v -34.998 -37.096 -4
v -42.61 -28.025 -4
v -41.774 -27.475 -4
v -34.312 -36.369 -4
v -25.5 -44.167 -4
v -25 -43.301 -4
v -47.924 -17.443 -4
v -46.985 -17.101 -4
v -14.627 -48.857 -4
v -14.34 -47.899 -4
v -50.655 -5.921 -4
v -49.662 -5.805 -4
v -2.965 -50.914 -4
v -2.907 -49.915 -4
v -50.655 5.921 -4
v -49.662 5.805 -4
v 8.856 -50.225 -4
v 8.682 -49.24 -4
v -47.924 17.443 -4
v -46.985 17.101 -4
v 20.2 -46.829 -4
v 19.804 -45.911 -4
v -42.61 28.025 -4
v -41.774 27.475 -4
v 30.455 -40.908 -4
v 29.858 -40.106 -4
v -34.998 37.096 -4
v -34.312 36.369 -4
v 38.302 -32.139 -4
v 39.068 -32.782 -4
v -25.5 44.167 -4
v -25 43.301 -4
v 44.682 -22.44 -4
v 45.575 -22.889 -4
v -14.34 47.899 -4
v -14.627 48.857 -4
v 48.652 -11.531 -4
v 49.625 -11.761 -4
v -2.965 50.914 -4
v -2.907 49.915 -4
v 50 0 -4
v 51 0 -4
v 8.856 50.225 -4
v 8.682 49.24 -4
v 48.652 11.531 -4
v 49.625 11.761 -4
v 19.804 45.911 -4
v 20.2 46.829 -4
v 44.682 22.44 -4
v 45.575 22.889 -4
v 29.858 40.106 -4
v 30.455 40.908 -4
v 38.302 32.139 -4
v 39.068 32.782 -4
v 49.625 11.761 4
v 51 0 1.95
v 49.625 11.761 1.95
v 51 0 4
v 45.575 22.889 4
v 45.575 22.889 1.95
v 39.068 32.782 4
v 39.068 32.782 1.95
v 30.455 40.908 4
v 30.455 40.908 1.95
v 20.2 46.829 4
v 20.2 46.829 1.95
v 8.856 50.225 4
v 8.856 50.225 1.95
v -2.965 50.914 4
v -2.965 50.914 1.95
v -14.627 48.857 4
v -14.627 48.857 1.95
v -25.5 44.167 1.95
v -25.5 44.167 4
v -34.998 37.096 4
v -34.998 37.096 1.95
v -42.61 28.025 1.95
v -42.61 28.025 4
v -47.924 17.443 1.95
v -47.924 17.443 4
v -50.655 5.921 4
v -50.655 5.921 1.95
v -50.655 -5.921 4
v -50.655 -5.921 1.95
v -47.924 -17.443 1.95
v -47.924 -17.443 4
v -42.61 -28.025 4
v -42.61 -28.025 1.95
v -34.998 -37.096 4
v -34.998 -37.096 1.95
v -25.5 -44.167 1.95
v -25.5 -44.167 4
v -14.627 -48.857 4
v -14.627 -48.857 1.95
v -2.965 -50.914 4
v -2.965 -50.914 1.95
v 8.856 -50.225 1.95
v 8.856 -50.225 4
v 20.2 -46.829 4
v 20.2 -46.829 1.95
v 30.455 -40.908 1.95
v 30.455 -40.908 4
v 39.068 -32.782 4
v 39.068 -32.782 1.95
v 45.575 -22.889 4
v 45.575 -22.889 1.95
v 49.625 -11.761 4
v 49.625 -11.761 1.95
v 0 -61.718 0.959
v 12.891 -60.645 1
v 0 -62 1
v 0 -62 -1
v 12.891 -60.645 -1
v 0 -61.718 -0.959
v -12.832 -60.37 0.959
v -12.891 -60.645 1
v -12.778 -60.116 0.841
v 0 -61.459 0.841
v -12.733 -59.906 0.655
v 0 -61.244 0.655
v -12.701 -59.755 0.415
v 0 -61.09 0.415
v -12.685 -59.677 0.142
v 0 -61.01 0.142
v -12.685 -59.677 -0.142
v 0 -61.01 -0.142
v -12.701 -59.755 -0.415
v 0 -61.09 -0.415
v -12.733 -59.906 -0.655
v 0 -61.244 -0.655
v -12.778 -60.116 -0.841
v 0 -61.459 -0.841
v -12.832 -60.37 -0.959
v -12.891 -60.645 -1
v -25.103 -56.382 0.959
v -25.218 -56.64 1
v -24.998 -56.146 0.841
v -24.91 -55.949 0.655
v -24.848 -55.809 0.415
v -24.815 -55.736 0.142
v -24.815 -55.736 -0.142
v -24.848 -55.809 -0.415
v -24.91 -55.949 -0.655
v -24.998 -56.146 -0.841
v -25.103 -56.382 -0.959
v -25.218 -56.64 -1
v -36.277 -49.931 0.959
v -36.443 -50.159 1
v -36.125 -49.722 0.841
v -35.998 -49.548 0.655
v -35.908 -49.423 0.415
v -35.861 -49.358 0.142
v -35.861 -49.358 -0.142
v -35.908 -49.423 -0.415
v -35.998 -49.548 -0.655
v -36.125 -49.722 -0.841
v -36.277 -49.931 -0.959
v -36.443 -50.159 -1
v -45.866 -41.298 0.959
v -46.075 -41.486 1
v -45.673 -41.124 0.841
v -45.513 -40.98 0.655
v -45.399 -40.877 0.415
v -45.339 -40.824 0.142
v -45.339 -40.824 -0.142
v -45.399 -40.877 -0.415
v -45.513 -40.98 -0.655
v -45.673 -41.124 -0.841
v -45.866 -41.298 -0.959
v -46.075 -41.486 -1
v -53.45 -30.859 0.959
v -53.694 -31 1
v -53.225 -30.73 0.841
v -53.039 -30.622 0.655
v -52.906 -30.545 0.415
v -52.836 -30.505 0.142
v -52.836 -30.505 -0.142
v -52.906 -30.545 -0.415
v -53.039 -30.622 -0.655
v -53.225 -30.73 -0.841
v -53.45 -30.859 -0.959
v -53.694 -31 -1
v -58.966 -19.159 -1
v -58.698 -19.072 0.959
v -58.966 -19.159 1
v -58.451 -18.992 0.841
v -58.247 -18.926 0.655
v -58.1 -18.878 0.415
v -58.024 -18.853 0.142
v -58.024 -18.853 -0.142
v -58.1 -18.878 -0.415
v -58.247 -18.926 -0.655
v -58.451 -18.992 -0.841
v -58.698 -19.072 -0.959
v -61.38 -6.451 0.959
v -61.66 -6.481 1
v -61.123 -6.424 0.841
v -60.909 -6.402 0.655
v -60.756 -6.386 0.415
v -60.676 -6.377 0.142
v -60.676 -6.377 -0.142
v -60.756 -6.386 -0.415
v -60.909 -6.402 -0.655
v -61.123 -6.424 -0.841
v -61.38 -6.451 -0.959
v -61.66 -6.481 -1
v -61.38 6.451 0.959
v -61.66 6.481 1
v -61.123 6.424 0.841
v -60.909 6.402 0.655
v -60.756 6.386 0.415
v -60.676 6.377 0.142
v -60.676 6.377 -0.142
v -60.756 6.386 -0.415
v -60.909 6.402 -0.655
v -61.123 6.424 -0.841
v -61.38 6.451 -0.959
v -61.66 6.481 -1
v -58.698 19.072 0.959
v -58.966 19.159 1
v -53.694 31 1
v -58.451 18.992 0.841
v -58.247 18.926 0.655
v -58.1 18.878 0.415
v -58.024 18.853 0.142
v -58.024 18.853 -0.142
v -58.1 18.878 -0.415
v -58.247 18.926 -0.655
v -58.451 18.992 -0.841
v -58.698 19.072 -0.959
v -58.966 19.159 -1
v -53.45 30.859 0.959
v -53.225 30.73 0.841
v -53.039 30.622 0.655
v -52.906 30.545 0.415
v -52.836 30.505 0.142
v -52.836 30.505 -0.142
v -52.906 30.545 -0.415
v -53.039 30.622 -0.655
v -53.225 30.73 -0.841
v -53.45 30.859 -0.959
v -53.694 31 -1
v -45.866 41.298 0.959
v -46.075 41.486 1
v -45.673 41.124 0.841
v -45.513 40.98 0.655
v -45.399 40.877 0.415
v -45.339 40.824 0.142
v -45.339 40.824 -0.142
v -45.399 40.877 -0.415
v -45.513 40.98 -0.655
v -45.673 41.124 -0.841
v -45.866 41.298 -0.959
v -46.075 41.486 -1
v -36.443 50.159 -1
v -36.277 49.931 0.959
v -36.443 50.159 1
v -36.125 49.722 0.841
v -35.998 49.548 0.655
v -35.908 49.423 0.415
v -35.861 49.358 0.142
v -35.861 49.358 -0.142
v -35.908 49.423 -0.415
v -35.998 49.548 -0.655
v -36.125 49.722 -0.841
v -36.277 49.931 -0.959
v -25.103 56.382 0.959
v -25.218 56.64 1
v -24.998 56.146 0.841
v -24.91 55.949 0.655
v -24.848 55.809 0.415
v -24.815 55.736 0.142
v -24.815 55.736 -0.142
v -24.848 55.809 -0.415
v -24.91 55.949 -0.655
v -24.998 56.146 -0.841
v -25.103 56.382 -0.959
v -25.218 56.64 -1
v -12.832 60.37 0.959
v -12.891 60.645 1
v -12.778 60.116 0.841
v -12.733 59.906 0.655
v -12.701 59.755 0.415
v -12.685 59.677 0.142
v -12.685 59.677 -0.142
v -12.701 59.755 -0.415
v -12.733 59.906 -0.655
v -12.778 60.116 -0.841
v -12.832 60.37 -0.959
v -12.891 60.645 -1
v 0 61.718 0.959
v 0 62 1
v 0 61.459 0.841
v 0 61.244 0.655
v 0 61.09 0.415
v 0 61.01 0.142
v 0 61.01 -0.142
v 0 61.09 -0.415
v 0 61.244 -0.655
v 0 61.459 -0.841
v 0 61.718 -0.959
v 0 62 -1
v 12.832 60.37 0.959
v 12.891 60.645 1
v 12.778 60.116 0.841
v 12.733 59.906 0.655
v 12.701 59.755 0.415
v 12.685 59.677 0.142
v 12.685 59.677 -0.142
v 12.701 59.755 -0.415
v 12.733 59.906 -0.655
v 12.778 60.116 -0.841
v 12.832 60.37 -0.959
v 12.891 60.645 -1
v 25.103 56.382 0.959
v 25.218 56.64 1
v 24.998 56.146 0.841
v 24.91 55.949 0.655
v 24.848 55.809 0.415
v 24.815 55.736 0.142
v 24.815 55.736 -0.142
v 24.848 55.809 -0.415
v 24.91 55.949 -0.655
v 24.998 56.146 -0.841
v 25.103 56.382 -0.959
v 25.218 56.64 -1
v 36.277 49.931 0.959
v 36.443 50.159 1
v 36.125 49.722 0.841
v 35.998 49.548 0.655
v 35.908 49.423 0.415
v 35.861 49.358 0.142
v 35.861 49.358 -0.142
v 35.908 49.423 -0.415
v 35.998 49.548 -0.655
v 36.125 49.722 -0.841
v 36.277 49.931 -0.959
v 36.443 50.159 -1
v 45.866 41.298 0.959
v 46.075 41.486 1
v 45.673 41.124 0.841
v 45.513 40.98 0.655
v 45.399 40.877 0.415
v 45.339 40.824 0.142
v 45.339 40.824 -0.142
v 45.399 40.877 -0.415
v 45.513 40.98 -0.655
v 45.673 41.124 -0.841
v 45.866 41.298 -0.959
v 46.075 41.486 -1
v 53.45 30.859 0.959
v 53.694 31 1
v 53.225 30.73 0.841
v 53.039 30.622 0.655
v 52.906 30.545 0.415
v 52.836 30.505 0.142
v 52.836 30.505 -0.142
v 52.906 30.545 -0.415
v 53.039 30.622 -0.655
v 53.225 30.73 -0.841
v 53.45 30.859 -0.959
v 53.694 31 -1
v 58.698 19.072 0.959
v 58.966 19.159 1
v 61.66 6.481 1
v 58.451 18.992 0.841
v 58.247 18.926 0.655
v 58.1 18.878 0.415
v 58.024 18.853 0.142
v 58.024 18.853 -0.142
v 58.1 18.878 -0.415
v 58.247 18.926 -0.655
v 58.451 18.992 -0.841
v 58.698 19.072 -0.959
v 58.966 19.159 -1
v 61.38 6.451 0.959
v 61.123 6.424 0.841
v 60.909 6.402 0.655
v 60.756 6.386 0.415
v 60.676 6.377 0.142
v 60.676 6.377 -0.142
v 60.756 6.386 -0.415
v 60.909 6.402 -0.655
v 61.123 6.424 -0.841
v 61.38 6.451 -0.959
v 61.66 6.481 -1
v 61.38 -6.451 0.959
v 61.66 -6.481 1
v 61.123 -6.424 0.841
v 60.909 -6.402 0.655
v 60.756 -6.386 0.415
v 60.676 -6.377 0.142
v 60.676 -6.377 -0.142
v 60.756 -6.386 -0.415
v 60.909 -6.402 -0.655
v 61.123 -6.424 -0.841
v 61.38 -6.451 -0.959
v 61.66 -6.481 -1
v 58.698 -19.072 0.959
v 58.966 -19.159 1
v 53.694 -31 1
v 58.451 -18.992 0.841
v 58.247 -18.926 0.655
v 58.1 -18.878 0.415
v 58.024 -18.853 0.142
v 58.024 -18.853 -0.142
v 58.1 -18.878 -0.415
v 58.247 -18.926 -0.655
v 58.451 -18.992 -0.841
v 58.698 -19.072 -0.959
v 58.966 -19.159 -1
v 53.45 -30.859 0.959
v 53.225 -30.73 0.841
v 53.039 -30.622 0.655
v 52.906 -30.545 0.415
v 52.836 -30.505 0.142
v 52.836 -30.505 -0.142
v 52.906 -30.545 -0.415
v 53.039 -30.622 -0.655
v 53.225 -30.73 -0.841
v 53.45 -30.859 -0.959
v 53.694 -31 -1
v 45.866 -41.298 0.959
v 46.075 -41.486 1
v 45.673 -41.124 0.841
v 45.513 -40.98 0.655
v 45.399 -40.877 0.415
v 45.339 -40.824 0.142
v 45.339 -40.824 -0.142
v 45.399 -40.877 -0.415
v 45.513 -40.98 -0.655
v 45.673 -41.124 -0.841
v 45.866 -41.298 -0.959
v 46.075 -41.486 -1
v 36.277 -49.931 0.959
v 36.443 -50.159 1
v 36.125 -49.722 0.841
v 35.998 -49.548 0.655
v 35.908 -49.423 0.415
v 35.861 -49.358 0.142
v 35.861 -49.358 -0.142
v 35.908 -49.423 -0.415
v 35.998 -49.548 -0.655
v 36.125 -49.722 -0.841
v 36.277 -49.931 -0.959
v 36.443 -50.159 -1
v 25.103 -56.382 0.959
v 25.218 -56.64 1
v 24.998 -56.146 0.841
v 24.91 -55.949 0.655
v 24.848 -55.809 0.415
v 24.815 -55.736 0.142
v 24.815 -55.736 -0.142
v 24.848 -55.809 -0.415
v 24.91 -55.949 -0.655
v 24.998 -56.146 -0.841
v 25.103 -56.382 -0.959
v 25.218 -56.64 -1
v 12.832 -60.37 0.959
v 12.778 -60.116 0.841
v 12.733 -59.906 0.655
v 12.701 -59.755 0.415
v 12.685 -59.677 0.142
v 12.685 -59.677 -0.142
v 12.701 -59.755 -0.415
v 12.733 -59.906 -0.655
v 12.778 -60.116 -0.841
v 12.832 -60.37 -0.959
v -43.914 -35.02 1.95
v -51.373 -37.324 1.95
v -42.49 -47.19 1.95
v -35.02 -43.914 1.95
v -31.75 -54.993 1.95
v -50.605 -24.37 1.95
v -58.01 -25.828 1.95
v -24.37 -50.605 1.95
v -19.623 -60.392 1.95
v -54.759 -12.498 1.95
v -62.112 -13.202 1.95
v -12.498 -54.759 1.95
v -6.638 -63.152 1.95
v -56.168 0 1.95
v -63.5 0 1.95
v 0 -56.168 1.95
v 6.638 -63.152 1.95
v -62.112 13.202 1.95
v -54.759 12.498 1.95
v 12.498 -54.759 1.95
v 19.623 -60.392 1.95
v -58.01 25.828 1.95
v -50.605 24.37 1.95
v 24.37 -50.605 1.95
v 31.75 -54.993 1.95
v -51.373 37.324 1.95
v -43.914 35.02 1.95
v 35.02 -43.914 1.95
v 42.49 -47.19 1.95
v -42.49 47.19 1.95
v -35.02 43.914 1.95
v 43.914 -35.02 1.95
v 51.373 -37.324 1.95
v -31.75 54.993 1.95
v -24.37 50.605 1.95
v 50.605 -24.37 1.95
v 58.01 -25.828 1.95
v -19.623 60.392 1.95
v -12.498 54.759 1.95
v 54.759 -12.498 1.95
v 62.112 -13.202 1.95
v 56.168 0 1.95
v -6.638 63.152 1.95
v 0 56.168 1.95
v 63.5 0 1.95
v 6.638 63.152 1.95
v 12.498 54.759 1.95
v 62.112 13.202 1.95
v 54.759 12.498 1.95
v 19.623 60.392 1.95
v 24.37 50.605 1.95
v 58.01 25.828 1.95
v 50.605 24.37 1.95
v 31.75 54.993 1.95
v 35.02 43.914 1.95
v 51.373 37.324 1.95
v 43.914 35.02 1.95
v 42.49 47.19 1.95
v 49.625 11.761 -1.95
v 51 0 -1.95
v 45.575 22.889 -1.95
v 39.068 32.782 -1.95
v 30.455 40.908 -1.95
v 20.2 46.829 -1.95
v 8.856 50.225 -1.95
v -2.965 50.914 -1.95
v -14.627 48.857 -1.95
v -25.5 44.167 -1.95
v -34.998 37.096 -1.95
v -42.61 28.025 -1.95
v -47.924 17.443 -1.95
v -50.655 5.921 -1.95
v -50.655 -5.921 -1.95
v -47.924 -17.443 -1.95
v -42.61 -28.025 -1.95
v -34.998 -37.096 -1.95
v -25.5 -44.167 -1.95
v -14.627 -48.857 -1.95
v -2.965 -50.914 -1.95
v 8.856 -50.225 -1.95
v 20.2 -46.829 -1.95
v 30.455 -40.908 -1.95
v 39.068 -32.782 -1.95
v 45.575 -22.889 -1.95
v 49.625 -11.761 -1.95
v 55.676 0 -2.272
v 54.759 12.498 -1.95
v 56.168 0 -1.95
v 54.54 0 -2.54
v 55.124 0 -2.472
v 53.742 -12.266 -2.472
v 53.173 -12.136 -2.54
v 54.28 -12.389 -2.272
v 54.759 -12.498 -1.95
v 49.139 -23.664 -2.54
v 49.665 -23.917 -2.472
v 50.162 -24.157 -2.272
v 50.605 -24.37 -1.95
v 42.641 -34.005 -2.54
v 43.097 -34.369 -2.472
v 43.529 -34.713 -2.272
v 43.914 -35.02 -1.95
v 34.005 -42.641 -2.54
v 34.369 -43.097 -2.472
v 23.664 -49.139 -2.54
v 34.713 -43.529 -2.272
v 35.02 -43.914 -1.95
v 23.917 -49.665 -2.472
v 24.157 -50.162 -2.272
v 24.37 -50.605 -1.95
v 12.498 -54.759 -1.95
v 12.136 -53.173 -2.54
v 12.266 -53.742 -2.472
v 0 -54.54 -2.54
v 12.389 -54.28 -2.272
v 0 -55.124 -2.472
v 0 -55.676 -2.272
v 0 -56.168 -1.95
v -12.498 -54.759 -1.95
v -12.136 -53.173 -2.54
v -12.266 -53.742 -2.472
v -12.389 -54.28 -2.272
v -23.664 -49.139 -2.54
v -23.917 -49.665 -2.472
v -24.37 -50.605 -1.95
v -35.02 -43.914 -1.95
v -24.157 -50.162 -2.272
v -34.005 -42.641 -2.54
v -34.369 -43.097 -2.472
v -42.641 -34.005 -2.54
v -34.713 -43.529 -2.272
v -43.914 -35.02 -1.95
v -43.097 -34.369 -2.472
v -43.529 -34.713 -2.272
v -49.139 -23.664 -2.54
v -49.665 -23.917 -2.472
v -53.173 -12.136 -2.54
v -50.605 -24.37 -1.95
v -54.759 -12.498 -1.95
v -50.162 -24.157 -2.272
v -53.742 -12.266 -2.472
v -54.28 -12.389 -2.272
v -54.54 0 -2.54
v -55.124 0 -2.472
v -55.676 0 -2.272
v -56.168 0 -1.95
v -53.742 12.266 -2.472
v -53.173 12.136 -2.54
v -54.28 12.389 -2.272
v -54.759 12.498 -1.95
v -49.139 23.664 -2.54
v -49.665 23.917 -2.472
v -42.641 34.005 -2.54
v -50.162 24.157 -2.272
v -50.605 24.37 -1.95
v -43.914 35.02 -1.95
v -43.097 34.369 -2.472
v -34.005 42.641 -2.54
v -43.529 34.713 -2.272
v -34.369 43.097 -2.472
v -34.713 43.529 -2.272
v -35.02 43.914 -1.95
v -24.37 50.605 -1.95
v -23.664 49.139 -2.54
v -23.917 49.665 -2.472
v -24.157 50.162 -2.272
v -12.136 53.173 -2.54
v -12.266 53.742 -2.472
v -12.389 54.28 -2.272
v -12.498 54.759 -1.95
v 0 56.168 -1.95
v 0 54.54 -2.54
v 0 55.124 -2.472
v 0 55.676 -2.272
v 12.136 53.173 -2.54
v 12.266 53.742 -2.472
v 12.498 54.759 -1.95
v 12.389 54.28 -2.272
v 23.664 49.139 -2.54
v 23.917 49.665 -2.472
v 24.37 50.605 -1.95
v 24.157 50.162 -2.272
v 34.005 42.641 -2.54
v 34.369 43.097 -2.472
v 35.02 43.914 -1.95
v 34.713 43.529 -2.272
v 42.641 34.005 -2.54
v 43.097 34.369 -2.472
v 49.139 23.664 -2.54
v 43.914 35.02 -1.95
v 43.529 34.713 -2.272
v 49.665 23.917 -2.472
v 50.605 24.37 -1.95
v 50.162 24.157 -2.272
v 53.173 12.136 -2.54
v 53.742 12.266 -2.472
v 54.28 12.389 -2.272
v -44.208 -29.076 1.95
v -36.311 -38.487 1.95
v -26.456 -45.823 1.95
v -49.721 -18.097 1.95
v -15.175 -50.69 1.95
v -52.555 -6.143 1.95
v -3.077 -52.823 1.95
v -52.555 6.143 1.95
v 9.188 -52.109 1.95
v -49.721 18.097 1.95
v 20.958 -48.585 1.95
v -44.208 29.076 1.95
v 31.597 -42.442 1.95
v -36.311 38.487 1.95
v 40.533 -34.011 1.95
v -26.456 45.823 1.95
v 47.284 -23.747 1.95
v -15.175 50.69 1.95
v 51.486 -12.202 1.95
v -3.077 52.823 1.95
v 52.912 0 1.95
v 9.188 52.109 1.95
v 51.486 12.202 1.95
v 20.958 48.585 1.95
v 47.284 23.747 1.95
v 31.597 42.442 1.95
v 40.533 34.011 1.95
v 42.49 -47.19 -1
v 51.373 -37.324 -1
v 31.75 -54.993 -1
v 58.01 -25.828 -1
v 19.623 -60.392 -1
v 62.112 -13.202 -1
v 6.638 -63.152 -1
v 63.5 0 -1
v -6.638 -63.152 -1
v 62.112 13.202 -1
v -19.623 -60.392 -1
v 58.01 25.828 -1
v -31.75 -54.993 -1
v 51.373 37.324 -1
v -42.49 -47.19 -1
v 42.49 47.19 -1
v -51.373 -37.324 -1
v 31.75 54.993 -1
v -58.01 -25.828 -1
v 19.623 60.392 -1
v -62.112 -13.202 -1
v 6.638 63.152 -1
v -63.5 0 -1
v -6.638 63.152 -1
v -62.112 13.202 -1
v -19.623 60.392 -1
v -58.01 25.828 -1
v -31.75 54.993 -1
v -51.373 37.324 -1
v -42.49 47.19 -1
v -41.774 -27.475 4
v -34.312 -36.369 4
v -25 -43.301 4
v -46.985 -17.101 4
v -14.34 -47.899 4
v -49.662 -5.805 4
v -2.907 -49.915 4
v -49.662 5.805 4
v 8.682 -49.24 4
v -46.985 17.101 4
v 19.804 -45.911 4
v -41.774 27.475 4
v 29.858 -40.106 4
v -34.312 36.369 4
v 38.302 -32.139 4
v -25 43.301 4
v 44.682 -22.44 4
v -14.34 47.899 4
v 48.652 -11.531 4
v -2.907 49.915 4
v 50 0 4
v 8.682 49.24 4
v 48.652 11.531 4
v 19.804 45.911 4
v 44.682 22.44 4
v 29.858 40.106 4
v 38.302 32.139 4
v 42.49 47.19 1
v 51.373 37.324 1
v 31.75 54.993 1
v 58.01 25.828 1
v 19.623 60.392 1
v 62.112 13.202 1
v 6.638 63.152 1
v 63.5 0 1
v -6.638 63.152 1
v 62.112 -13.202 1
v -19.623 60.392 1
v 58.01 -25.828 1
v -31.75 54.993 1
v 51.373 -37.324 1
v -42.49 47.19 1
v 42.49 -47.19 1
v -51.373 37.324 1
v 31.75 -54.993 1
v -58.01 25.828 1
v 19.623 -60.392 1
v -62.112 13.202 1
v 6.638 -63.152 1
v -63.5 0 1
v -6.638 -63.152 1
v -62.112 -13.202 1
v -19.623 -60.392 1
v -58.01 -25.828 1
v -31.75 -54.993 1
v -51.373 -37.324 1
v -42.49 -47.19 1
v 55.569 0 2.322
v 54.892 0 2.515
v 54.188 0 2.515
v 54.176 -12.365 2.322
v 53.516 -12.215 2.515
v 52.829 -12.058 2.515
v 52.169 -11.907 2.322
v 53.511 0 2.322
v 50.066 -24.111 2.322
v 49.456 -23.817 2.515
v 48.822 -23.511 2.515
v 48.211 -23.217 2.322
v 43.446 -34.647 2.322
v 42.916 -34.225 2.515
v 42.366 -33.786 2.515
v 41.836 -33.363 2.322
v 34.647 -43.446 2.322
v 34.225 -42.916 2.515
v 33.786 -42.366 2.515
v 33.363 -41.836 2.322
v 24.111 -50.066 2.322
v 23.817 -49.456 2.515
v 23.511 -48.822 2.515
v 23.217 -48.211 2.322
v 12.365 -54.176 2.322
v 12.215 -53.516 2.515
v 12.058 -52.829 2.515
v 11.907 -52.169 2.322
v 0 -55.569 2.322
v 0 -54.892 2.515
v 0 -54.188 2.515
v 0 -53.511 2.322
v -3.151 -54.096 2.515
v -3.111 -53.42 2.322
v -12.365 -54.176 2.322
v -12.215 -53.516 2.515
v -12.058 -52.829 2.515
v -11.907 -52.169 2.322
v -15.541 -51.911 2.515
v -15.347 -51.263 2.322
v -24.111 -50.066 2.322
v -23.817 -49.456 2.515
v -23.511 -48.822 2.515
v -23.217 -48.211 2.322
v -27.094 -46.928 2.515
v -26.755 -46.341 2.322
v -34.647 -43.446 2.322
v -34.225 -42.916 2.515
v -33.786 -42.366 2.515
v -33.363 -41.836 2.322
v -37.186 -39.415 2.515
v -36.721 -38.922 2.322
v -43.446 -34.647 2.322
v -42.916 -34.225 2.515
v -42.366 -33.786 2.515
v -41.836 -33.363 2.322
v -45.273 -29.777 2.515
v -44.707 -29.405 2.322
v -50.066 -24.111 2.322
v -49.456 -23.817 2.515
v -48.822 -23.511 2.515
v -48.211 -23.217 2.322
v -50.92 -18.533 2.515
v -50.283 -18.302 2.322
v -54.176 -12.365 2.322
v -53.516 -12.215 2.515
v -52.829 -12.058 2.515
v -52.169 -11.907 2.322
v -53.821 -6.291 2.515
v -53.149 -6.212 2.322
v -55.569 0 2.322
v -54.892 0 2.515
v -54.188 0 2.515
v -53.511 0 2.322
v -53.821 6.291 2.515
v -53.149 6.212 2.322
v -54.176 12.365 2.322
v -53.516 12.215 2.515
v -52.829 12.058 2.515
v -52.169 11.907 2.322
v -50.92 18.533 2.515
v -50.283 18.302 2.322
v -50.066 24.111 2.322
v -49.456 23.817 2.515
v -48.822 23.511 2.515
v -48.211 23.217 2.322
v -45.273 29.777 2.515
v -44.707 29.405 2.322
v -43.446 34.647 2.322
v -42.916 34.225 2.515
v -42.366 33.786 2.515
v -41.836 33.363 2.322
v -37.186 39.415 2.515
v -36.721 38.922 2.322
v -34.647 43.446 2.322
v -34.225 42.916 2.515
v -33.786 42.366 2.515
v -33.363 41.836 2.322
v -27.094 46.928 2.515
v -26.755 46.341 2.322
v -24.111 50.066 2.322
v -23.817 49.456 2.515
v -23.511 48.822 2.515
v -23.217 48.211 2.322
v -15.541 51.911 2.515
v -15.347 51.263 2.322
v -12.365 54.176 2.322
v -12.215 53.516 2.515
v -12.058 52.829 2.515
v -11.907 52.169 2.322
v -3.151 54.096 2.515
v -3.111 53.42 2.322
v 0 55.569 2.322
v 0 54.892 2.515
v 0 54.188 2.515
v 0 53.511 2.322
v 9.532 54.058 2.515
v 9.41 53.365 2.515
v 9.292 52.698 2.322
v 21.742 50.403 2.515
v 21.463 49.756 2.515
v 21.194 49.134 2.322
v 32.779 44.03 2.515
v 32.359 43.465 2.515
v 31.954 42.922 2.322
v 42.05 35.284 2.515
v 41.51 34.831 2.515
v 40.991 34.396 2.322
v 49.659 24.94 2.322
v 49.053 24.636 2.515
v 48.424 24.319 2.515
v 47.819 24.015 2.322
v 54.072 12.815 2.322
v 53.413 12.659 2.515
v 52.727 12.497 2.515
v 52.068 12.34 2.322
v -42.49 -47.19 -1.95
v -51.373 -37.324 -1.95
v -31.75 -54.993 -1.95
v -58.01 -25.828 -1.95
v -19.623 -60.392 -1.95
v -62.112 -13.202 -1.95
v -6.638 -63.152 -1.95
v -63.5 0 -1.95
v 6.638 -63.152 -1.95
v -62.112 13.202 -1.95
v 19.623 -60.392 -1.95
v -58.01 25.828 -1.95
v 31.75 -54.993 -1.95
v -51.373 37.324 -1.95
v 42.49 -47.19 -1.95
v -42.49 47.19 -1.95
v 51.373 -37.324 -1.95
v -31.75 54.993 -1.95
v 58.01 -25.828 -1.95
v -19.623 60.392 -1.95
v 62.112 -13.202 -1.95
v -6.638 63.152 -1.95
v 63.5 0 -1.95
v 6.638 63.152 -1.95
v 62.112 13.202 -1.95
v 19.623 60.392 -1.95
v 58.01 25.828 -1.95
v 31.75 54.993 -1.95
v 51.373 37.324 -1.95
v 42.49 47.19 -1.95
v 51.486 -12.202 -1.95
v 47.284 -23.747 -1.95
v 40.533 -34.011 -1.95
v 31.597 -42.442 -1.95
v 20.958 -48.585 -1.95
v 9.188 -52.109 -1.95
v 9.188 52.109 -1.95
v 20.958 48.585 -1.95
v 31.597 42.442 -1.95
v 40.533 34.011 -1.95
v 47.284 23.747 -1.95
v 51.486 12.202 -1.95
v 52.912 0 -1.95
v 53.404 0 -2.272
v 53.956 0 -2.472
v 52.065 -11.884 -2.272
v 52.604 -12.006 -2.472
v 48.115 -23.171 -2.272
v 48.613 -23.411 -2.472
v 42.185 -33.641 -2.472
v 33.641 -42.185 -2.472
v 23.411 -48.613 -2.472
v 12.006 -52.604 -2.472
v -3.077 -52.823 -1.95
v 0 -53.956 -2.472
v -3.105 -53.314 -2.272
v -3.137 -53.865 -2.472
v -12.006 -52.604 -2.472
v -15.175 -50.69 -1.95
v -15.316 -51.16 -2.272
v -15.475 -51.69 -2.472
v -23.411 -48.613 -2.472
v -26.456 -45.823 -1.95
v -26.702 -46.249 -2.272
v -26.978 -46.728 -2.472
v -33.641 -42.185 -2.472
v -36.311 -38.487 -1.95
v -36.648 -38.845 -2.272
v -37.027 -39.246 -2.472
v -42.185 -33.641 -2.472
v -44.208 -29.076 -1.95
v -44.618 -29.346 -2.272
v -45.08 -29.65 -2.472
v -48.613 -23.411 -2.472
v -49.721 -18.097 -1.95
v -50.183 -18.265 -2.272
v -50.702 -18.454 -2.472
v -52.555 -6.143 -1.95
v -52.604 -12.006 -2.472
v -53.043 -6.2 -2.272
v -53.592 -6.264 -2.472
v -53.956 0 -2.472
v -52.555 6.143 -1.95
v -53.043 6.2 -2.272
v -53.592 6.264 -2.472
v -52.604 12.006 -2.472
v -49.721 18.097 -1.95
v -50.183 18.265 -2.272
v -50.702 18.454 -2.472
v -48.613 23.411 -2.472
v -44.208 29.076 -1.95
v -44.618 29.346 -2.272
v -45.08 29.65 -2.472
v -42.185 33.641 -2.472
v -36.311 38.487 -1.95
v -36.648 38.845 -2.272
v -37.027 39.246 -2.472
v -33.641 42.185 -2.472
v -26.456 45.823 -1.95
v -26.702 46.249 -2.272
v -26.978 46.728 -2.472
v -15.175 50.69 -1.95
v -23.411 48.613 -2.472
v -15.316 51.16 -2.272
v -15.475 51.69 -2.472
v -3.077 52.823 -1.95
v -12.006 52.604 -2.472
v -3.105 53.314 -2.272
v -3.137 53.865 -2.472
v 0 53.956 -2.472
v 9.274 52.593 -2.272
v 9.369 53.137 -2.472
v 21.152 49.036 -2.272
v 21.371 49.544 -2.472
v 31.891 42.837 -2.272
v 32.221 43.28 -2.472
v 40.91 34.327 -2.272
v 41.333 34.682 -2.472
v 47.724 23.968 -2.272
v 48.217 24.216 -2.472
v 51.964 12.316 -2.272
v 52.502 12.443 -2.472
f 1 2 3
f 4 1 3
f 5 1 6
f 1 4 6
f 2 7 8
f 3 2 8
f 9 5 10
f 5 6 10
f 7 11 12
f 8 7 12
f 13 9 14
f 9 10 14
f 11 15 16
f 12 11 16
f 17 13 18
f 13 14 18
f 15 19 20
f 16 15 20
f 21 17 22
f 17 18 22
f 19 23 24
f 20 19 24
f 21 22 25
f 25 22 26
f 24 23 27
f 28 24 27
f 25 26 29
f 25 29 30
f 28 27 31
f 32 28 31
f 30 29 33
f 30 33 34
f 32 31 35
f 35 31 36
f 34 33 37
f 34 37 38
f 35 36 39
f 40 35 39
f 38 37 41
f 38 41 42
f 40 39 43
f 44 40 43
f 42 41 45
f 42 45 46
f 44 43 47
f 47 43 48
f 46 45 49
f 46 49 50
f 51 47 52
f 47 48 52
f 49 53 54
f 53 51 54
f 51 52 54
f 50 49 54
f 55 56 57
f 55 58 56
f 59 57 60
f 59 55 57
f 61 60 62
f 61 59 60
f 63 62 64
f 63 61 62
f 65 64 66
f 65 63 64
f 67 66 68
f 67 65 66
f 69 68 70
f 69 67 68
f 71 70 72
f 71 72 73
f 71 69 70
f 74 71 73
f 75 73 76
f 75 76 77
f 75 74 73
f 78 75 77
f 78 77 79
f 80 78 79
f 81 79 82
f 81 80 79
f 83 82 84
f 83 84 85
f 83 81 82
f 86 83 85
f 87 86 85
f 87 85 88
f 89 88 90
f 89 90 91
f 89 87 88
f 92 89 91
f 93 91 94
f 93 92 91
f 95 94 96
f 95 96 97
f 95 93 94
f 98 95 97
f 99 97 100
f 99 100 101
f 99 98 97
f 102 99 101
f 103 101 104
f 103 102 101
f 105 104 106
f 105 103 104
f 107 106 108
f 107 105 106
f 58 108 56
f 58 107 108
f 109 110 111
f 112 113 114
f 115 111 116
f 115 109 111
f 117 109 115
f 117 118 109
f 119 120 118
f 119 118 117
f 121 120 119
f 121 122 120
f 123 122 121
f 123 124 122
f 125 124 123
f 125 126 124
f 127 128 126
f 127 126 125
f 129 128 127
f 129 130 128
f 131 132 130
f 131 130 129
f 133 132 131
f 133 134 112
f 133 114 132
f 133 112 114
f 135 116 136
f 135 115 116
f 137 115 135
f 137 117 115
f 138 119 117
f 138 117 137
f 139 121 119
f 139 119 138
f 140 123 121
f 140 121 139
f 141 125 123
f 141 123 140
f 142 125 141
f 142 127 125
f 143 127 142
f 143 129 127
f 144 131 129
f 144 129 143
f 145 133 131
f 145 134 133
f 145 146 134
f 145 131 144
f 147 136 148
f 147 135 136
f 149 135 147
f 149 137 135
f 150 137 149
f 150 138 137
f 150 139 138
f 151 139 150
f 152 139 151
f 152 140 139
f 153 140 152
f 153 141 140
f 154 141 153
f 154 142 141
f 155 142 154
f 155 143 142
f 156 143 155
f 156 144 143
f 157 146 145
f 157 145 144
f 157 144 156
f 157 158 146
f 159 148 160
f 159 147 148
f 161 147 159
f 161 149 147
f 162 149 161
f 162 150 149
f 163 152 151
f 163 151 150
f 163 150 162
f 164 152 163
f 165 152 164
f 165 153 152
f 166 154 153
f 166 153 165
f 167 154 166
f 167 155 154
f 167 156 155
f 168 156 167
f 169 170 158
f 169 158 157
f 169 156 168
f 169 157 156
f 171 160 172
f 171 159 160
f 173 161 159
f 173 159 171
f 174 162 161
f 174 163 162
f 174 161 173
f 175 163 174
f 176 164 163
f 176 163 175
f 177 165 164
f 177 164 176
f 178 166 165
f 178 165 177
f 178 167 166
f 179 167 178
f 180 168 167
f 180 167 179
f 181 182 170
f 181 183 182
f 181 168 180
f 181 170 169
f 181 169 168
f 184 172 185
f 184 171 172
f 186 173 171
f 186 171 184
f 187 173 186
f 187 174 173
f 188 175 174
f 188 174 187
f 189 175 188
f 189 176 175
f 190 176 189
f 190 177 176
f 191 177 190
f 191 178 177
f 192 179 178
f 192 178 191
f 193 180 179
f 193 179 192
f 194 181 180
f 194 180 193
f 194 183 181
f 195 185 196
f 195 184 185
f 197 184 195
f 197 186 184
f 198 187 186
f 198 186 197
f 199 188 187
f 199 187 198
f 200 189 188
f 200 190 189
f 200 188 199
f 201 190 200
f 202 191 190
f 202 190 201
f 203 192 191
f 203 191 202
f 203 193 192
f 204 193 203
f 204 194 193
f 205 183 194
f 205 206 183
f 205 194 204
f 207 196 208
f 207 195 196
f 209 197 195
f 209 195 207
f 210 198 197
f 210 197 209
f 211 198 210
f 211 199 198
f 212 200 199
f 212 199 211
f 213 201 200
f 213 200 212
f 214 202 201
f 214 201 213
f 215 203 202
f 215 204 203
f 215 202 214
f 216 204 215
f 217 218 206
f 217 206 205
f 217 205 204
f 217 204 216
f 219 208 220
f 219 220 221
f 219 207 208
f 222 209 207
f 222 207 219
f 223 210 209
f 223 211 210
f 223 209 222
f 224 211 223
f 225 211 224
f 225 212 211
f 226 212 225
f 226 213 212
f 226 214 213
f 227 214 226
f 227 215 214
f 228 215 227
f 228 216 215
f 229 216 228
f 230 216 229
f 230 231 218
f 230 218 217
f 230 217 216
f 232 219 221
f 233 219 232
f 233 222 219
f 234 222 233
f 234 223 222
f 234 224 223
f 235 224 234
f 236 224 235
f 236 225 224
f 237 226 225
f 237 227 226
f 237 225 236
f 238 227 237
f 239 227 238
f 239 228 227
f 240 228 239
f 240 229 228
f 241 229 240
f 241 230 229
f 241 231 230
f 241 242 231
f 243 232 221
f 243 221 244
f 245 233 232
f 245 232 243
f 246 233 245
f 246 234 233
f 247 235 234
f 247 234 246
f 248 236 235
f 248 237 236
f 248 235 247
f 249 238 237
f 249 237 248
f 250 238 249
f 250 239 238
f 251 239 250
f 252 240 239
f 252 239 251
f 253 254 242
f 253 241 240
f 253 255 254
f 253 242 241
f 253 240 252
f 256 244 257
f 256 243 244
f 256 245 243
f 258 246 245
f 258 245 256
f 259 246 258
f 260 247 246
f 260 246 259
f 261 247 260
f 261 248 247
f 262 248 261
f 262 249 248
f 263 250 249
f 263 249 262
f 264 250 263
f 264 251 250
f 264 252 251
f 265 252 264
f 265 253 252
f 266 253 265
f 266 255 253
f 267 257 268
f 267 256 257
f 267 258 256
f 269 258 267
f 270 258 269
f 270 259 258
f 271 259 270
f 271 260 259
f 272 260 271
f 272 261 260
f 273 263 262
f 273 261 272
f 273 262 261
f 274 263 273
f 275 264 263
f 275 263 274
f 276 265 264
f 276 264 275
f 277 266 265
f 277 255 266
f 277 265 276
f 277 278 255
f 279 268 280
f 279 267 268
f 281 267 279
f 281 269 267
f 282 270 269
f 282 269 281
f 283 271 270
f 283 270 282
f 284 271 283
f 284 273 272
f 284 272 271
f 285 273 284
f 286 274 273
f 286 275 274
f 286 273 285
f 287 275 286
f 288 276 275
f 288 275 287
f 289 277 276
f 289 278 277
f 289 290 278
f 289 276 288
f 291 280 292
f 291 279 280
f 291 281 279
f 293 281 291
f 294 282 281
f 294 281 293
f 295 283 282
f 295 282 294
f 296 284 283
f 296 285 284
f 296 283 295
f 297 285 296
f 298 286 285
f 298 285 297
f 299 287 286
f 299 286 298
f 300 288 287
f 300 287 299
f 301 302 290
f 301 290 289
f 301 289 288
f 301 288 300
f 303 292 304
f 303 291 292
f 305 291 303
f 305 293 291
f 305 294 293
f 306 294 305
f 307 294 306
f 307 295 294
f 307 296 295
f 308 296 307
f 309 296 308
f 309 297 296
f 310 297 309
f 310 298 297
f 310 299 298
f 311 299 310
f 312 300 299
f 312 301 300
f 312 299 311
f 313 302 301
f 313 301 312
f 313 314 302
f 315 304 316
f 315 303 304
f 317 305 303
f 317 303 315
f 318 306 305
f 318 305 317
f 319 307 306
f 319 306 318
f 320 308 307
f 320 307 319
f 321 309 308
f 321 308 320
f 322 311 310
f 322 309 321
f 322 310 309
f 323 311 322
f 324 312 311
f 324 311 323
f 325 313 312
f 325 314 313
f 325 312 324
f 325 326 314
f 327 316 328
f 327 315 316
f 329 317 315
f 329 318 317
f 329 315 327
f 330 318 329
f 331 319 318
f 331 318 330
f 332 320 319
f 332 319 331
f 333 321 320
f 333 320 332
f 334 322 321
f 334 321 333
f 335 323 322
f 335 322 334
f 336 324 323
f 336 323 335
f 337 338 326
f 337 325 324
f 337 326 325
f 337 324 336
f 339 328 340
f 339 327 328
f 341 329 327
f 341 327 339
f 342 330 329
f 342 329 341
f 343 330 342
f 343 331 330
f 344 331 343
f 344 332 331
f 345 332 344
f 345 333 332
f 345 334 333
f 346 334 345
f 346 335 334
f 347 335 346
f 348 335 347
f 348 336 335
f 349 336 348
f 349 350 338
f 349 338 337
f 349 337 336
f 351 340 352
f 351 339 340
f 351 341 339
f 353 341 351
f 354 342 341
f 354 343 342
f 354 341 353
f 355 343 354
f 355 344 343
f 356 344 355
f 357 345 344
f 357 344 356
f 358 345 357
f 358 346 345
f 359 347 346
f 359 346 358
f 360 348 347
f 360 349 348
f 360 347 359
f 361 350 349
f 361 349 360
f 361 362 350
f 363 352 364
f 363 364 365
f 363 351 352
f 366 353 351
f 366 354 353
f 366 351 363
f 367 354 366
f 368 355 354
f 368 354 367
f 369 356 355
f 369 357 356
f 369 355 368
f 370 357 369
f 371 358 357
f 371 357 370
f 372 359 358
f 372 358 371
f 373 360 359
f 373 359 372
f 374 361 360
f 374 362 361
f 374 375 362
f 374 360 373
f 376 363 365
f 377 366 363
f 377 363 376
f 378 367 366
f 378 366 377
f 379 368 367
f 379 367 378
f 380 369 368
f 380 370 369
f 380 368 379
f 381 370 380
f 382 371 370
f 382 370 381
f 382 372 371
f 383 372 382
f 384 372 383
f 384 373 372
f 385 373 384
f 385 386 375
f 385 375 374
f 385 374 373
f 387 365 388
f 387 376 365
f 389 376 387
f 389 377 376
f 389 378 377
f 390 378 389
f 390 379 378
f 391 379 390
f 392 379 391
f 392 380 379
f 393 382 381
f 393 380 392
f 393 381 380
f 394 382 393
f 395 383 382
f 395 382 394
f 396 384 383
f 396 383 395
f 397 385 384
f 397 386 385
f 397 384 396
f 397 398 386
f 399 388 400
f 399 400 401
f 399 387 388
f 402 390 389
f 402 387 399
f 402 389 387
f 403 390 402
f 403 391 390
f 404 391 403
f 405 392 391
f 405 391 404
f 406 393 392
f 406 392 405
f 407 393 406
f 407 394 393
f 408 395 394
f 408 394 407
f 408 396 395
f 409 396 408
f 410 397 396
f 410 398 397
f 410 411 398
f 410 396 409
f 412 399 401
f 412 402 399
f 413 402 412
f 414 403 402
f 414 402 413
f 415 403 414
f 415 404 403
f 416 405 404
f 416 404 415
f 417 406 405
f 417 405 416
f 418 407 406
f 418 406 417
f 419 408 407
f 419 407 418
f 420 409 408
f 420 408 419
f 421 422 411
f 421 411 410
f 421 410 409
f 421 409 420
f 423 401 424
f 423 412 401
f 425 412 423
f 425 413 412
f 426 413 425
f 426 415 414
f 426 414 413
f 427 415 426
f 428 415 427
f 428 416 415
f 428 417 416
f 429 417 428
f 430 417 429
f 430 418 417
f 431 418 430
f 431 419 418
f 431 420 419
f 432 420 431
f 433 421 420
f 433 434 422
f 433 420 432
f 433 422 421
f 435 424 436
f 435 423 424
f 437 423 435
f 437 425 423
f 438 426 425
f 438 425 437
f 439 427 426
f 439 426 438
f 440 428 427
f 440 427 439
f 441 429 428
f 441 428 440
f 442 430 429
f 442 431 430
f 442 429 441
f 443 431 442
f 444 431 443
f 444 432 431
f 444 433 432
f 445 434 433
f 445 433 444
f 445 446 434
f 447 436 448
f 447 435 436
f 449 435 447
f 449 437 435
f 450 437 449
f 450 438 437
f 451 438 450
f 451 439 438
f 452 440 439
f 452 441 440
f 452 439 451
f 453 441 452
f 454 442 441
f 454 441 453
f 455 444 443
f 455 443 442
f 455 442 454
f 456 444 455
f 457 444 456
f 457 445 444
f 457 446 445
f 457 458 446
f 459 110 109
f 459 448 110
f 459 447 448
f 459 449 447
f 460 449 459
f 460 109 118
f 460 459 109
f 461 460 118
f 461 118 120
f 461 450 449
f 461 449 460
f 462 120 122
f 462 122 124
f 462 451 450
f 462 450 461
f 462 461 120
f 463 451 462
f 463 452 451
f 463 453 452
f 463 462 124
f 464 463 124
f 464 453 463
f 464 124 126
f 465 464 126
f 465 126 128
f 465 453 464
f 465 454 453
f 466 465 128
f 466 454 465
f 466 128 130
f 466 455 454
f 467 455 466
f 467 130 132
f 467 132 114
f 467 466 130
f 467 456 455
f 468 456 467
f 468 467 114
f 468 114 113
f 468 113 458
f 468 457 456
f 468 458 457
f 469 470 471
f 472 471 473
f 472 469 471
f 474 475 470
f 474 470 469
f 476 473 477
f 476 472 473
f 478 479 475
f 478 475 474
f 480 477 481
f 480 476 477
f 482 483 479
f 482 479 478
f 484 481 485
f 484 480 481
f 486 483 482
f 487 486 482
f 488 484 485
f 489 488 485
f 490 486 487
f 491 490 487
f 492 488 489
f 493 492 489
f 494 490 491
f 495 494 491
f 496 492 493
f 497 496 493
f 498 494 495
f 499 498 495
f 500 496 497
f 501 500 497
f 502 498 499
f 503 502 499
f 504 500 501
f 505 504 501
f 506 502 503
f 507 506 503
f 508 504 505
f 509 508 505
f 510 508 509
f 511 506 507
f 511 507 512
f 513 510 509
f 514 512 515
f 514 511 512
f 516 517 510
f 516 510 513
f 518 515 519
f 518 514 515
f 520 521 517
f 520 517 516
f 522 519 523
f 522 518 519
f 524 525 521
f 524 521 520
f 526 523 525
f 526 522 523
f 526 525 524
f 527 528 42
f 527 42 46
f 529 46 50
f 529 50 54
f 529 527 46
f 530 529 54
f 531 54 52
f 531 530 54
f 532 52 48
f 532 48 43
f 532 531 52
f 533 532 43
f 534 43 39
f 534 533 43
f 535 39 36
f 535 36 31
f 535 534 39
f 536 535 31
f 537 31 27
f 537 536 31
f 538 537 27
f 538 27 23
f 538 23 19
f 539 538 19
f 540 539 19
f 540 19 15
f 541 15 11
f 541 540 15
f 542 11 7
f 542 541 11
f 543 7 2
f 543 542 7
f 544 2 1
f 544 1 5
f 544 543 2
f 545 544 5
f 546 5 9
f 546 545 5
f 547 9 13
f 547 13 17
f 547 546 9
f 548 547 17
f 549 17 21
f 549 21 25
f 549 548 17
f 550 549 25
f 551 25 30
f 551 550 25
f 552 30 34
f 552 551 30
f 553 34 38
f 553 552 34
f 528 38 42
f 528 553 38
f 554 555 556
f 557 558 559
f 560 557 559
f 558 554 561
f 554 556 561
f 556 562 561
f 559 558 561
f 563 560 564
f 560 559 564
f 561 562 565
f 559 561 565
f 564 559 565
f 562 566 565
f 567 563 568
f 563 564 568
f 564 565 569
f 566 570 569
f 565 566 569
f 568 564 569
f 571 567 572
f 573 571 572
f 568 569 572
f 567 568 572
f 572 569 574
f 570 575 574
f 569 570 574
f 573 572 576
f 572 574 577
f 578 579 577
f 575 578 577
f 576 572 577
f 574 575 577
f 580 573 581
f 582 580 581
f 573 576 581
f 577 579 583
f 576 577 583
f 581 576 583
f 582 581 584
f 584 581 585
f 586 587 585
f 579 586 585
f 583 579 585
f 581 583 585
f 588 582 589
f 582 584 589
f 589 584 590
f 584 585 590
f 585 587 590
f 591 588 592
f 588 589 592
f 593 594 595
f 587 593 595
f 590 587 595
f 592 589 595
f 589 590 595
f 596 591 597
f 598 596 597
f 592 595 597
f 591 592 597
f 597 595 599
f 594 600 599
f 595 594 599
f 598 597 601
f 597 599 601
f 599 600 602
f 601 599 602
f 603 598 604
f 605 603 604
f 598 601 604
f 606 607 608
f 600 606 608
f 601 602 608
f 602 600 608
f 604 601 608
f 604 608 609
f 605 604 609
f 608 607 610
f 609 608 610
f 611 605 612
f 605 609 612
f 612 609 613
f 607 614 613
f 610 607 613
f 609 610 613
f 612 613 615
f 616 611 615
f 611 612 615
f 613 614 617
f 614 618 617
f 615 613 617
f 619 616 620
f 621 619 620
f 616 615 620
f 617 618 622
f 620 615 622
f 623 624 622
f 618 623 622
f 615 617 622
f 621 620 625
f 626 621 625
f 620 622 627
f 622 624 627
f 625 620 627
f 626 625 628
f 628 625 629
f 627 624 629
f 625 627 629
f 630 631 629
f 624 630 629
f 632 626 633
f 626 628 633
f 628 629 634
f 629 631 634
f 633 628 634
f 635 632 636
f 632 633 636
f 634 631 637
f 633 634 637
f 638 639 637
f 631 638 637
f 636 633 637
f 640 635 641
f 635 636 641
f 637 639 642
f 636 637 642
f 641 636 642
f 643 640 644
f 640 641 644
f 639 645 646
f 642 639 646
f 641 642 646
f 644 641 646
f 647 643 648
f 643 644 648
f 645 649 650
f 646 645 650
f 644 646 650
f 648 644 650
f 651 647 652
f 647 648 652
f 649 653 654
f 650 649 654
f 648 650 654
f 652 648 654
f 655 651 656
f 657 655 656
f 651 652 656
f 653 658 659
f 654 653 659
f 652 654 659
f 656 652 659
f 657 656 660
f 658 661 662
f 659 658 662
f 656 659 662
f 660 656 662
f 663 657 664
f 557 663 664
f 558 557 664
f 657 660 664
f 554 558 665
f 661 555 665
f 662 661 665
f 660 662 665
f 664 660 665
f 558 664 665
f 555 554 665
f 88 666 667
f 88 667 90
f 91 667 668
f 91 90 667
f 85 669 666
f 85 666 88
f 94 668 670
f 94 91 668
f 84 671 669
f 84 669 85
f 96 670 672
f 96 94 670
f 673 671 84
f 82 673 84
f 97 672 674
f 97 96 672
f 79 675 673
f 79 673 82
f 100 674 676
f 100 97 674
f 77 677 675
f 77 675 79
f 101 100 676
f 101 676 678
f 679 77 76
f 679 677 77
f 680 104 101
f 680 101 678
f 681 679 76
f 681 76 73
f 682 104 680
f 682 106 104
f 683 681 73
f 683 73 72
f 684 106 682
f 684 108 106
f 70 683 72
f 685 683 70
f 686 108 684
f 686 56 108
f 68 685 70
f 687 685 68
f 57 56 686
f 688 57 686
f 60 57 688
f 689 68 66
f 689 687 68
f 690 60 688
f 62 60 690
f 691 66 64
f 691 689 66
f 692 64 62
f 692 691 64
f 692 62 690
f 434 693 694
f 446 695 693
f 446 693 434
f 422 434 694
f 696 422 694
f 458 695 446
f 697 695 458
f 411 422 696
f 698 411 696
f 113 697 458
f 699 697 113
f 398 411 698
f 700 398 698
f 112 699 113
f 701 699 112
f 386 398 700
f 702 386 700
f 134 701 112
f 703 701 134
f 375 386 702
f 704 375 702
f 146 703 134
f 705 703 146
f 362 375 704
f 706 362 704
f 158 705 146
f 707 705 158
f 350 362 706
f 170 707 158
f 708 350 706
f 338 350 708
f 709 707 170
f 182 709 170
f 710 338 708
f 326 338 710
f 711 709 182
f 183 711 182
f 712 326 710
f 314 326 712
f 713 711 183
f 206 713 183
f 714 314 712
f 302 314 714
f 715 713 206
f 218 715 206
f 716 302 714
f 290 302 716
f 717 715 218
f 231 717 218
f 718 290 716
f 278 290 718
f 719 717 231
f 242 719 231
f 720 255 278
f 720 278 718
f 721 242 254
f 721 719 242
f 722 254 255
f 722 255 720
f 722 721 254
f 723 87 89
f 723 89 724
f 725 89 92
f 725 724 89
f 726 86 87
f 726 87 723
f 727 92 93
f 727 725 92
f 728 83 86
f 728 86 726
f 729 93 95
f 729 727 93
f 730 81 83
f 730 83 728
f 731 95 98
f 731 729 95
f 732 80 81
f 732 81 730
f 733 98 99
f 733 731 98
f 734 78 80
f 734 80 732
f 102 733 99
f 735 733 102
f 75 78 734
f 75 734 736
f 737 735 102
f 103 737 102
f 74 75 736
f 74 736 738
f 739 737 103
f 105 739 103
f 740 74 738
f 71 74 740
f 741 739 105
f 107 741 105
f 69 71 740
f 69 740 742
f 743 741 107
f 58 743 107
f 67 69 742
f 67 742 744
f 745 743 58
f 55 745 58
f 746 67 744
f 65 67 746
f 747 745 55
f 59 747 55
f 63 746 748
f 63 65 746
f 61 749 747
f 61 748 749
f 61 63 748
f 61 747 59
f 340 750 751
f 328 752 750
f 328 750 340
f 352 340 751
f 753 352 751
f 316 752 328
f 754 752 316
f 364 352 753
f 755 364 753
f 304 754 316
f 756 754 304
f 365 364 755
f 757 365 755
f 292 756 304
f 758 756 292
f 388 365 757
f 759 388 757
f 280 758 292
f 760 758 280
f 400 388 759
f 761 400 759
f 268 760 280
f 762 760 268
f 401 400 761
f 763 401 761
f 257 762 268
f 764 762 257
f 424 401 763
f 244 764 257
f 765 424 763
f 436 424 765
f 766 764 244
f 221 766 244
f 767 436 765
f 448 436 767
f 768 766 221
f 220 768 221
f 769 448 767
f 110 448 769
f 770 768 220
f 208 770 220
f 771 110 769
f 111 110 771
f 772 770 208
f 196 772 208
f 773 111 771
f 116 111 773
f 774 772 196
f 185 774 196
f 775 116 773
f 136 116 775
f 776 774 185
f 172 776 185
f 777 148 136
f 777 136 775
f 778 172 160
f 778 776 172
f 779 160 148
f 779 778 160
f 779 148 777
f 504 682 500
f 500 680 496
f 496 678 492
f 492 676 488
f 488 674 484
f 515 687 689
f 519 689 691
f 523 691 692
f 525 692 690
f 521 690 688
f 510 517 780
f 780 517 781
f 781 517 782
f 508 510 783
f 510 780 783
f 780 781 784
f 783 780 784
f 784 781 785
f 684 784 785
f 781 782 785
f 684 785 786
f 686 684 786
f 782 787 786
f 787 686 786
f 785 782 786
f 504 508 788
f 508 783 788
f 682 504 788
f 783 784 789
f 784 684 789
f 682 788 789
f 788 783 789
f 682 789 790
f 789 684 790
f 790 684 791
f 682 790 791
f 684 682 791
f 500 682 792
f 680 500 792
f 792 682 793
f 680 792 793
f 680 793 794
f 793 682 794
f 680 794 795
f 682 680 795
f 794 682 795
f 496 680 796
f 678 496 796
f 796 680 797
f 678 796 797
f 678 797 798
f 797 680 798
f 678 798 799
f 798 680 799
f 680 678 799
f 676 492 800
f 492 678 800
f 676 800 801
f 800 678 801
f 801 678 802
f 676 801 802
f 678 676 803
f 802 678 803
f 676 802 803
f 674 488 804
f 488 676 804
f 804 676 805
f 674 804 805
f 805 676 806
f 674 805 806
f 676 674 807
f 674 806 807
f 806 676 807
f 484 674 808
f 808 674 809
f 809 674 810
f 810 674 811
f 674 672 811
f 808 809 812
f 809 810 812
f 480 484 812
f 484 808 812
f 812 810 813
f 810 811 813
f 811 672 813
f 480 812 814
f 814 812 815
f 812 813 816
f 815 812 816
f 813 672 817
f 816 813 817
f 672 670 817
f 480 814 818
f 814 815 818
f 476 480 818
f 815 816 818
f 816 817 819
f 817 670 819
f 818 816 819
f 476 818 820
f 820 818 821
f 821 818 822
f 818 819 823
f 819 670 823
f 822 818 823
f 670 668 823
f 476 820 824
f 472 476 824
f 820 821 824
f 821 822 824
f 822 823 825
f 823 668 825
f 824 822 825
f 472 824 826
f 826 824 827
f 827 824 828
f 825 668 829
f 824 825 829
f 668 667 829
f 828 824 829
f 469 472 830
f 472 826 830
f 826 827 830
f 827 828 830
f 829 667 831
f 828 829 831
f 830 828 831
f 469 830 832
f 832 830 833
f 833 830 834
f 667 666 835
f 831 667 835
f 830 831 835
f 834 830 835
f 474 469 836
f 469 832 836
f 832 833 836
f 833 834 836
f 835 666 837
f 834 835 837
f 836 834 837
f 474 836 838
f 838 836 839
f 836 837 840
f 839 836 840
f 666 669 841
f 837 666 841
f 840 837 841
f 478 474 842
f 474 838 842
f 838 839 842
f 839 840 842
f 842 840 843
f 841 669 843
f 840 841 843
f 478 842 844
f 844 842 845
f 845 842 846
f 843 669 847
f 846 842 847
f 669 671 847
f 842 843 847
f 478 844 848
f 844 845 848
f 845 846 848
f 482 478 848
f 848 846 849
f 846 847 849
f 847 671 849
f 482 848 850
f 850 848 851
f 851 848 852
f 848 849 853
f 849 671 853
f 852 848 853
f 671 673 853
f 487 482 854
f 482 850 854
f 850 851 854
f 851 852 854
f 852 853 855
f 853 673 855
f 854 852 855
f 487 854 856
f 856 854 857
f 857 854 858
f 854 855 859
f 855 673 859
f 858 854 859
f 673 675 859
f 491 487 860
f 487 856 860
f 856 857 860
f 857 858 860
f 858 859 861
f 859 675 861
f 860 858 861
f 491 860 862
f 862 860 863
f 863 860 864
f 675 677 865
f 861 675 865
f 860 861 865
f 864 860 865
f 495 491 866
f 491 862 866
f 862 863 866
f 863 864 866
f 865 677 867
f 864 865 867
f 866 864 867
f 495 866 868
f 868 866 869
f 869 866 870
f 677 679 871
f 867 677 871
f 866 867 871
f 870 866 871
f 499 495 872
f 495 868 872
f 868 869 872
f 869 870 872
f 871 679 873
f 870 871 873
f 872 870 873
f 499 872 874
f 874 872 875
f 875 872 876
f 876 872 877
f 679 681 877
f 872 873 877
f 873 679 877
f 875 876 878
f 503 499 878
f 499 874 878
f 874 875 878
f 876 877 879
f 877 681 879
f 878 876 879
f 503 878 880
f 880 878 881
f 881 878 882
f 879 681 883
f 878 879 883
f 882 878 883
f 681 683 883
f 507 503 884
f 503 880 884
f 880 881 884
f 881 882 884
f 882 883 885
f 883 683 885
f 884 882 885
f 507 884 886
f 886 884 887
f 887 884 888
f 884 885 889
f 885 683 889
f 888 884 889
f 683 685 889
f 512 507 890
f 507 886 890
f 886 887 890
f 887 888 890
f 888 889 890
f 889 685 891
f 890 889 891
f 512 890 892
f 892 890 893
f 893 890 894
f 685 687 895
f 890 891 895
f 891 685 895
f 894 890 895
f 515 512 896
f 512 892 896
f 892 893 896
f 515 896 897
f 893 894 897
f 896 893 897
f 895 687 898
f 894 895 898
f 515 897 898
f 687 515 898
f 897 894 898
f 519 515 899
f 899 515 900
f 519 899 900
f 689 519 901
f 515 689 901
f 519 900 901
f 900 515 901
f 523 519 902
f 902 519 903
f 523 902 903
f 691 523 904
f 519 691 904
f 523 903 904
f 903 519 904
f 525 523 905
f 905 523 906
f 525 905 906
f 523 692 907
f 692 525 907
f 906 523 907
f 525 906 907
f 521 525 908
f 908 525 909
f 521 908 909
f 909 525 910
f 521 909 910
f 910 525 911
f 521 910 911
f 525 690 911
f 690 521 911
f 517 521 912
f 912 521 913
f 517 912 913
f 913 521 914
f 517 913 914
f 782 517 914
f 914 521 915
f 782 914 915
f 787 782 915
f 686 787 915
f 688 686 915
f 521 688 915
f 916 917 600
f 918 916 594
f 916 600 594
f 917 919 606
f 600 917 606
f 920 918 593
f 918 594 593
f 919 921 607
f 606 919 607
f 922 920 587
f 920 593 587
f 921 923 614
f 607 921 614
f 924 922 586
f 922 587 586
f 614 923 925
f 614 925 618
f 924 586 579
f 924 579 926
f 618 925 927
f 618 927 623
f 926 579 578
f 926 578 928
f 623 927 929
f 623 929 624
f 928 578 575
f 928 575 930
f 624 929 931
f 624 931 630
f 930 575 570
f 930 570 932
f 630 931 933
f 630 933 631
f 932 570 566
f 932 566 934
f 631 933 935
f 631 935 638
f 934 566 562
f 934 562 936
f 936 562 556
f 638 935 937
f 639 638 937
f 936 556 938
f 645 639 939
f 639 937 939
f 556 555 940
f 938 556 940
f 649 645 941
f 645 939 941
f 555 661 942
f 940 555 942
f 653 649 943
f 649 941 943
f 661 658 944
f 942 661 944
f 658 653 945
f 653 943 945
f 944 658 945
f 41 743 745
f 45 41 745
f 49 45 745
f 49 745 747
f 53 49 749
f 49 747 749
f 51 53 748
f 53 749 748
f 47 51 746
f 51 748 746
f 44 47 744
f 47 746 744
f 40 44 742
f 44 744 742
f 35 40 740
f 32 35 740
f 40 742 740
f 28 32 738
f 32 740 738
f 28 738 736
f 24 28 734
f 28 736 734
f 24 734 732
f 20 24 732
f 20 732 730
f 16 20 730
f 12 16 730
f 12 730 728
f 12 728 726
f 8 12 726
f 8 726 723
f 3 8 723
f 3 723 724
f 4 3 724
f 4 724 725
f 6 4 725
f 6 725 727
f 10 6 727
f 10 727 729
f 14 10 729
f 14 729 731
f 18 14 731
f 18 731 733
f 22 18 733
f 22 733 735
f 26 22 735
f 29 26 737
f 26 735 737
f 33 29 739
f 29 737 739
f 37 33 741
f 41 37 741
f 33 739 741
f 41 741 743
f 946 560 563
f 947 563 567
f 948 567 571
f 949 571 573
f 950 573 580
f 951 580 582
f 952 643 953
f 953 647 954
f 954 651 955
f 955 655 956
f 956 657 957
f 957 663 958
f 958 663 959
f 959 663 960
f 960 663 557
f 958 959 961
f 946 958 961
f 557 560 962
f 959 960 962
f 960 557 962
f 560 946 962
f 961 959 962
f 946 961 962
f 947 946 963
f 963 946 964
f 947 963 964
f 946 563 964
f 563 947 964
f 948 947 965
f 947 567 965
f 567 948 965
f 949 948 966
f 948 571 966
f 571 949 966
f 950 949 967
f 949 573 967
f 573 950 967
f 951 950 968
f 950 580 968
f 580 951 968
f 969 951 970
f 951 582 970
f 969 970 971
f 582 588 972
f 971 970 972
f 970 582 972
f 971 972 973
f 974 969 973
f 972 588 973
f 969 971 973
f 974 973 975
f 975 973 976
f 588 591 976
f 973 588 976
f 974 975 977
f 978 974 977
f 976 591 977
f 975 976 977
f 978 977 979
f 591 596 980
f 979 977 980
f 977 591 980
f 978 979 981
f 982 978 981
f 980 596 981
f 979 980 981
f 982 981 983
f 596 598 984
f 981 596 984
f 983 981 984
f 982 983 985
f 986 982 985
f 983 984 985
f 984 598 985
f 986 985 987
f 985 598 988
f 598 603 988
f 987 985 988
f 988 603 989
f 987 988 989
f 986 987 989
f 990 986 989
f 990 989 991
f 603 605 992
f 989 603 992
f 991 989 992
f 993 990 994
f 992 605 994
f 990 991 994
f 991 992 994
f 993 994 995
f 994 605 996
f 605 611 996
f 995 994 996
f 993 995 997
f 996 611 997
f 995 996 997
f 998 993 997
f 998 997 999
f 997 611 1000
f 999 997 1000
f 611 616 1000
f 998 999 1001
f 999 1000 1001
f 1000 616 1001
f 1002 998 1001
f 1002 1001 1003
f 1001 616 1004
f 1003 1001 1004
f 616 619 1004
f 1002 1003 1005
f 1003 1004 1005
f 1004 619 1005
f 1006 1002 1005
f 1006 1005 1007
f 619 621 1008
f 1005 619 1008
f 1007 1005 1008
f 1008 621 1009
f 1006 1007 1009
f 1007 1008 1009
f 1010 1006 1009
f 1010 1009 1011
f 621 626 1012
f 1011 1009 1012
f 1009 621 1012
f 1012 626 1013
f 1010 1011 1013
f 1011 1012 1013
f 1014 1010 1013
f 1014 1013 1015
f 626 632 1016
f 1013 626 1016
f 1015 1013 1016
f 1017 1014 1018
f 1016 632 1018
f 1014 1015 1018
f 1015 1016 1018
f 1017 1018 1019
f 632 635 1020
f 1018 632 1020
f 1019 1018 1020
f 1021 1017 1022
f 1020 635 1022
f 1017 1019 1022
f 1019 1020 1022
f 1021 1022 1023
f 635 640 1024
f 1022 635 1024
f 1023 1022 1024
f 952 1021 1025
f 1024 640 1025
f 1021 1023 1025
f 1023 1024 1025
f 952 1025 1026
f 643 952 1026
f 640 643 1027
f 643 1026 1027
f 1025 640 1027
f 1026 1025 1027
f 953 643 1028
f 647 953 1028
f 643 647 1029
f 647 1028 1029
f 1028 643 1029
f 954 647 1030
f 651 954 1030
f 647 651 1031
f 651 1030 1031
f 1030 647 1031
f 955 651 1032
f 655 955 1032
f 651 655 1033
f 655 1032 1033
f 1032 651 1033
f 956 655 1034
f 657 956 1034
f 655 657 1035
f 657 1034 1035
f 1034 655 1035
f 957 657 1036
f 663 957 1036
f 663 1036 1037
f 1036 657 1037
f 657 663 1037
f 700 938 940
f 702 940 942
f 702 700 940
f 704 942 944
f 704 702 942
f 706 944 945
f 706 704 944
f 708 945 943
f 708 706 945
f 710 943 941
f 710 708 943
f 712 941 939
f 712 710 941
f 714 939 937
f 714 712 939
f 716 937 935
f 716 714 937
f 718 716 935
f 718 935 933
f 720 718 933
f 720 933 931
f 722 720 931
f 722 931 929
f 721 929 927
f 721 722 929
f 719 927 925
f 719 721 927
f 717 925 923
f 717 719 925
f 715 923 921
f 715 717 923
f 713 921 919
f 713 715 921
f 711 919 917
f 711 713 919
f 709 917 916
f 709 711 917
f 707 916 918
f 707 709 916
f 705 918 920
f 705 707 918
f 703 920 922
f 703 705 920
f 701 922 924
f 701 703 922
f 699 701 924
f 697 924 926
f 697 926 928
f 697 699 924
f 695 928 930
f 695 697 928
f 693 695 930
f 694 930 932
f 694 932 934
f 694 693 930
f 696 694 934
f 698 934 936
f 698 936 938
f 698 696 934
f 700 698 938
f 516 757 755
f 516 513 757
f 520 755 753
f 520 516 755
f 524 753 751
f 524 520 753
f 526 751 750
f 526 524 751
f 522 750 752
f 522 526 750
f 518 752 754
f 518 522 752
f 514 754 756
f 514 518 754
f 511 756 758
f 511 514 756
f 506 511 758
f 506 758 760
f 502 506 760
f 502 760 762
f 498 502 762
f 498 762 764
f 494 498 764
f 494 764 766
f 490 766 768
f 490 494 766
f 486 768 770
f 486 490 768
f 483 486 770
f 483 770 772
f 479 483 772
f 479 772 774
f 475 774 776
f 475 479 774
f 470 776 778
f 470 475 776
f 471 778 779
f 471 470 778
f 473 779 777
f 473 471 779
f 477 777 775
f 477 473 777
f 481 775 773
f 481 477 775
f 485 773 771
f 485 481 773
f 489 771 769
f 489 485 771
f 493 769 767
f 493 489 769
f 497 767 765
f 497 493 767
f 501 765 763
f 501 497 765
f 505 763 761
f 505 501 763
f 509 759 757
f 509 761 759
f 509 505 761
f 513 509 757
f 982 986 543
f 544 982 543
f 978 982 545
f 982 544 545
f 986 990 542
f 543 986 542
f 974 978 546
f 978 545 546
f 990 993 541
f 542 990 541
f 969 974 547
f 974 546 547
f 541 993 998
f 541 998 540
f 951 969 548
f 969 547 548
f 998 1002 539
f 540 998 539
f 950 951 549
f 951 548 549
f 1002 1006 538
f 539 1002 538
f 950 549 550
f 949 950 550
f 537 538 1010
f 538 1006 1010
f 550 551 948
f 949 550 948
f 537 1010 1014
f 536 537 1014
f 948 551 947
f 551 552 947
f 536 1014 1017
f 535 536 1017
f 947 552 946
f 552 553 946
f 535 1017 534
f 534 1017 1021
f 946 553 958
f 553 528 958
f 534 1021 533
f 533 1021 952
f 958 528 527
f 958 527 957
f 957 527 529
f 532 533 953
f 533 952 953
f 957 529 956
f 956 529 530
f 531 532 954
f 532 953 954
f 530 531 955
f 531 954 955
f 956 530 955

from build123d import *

# Parameters (mm, degrees)
SKETCH1_R      = 63.5
EXTRUDE1_DEPTH = 1.95
SKETCH2_R      = 51
EXTRUDE2_DEPTH = 4
SKETCH3_R      = 50
EXTRUDE3_DEPTH = 91.158194303
SKETCH5_R      = 2.54


with BuildPart() as part:
    # Sketch1 → Extrude1 (new, symmetric)
    with BuildSketch(Plane.XY):
        Circle(SKETCH1_R)
    extrude(amount=EXTRUDE1_DEPTH, both=True)

    # Sketch2 → Extrude2 (add, symmetric)
    with BuildSketch(Plane.XY):
        Circle(SKETCH2_R)
    extrude(amount=EXTRUDE2_DEPTH, both=True)

    # Sketch3 → Extrude3 (cut, through all)
    with BuildSketch(Plane.XY.offset(4)):
        Circle(SKETCH3_R)
    extrude(amount=-EXTRUDE3_DEPTH, mode=Mode.SUBTRACT)

    # Sketch5 → Revolve2 (revolve)
    with BuildSketch(Plane(origin=(0, 0, 0), x_dir=(0, 0, -1), z_dir=(1, 0, 0)), mode=Mode.PRIVATE) as revolve2_sk:
        with Locations((0, 54.54)):
            Circle(SKETCH5_R)
    revolve(revolve2_sk.sketch.rotate(Axis((0, 0, 4), (0, 0, -1)), 90), axis=Axis((0, 0, 4), (0, 0, -1)))

    # Sketch6 → Cut-Revolve1 (revolve, cut)
    with BuildSketch(Plane(origin=(0, 0, 0), x_dir=(0, 0, -1), z_dir=(1, 0, 0)), mode=Mode.PRIVATE) as cut_revolve1_sk:
        with BuildLine():
            Line((-1, 63.5), (-1, 62))
            ThreePointArc((-1, 62), (0, 61), (1, 62))
            Line((1, 62), (1, 63.5))
            Line((1, 63.5), (-1, 63.5))
        make_face()
    revolve(cut_revolve1_sk.sketch.rotate(Axis((0, 0, 4), (0, 0, -1)), 180), axis=Axis((0, 0, 4), (0, 0, -1)), mode=Mode.SUBTRACT)


solid = part.part
